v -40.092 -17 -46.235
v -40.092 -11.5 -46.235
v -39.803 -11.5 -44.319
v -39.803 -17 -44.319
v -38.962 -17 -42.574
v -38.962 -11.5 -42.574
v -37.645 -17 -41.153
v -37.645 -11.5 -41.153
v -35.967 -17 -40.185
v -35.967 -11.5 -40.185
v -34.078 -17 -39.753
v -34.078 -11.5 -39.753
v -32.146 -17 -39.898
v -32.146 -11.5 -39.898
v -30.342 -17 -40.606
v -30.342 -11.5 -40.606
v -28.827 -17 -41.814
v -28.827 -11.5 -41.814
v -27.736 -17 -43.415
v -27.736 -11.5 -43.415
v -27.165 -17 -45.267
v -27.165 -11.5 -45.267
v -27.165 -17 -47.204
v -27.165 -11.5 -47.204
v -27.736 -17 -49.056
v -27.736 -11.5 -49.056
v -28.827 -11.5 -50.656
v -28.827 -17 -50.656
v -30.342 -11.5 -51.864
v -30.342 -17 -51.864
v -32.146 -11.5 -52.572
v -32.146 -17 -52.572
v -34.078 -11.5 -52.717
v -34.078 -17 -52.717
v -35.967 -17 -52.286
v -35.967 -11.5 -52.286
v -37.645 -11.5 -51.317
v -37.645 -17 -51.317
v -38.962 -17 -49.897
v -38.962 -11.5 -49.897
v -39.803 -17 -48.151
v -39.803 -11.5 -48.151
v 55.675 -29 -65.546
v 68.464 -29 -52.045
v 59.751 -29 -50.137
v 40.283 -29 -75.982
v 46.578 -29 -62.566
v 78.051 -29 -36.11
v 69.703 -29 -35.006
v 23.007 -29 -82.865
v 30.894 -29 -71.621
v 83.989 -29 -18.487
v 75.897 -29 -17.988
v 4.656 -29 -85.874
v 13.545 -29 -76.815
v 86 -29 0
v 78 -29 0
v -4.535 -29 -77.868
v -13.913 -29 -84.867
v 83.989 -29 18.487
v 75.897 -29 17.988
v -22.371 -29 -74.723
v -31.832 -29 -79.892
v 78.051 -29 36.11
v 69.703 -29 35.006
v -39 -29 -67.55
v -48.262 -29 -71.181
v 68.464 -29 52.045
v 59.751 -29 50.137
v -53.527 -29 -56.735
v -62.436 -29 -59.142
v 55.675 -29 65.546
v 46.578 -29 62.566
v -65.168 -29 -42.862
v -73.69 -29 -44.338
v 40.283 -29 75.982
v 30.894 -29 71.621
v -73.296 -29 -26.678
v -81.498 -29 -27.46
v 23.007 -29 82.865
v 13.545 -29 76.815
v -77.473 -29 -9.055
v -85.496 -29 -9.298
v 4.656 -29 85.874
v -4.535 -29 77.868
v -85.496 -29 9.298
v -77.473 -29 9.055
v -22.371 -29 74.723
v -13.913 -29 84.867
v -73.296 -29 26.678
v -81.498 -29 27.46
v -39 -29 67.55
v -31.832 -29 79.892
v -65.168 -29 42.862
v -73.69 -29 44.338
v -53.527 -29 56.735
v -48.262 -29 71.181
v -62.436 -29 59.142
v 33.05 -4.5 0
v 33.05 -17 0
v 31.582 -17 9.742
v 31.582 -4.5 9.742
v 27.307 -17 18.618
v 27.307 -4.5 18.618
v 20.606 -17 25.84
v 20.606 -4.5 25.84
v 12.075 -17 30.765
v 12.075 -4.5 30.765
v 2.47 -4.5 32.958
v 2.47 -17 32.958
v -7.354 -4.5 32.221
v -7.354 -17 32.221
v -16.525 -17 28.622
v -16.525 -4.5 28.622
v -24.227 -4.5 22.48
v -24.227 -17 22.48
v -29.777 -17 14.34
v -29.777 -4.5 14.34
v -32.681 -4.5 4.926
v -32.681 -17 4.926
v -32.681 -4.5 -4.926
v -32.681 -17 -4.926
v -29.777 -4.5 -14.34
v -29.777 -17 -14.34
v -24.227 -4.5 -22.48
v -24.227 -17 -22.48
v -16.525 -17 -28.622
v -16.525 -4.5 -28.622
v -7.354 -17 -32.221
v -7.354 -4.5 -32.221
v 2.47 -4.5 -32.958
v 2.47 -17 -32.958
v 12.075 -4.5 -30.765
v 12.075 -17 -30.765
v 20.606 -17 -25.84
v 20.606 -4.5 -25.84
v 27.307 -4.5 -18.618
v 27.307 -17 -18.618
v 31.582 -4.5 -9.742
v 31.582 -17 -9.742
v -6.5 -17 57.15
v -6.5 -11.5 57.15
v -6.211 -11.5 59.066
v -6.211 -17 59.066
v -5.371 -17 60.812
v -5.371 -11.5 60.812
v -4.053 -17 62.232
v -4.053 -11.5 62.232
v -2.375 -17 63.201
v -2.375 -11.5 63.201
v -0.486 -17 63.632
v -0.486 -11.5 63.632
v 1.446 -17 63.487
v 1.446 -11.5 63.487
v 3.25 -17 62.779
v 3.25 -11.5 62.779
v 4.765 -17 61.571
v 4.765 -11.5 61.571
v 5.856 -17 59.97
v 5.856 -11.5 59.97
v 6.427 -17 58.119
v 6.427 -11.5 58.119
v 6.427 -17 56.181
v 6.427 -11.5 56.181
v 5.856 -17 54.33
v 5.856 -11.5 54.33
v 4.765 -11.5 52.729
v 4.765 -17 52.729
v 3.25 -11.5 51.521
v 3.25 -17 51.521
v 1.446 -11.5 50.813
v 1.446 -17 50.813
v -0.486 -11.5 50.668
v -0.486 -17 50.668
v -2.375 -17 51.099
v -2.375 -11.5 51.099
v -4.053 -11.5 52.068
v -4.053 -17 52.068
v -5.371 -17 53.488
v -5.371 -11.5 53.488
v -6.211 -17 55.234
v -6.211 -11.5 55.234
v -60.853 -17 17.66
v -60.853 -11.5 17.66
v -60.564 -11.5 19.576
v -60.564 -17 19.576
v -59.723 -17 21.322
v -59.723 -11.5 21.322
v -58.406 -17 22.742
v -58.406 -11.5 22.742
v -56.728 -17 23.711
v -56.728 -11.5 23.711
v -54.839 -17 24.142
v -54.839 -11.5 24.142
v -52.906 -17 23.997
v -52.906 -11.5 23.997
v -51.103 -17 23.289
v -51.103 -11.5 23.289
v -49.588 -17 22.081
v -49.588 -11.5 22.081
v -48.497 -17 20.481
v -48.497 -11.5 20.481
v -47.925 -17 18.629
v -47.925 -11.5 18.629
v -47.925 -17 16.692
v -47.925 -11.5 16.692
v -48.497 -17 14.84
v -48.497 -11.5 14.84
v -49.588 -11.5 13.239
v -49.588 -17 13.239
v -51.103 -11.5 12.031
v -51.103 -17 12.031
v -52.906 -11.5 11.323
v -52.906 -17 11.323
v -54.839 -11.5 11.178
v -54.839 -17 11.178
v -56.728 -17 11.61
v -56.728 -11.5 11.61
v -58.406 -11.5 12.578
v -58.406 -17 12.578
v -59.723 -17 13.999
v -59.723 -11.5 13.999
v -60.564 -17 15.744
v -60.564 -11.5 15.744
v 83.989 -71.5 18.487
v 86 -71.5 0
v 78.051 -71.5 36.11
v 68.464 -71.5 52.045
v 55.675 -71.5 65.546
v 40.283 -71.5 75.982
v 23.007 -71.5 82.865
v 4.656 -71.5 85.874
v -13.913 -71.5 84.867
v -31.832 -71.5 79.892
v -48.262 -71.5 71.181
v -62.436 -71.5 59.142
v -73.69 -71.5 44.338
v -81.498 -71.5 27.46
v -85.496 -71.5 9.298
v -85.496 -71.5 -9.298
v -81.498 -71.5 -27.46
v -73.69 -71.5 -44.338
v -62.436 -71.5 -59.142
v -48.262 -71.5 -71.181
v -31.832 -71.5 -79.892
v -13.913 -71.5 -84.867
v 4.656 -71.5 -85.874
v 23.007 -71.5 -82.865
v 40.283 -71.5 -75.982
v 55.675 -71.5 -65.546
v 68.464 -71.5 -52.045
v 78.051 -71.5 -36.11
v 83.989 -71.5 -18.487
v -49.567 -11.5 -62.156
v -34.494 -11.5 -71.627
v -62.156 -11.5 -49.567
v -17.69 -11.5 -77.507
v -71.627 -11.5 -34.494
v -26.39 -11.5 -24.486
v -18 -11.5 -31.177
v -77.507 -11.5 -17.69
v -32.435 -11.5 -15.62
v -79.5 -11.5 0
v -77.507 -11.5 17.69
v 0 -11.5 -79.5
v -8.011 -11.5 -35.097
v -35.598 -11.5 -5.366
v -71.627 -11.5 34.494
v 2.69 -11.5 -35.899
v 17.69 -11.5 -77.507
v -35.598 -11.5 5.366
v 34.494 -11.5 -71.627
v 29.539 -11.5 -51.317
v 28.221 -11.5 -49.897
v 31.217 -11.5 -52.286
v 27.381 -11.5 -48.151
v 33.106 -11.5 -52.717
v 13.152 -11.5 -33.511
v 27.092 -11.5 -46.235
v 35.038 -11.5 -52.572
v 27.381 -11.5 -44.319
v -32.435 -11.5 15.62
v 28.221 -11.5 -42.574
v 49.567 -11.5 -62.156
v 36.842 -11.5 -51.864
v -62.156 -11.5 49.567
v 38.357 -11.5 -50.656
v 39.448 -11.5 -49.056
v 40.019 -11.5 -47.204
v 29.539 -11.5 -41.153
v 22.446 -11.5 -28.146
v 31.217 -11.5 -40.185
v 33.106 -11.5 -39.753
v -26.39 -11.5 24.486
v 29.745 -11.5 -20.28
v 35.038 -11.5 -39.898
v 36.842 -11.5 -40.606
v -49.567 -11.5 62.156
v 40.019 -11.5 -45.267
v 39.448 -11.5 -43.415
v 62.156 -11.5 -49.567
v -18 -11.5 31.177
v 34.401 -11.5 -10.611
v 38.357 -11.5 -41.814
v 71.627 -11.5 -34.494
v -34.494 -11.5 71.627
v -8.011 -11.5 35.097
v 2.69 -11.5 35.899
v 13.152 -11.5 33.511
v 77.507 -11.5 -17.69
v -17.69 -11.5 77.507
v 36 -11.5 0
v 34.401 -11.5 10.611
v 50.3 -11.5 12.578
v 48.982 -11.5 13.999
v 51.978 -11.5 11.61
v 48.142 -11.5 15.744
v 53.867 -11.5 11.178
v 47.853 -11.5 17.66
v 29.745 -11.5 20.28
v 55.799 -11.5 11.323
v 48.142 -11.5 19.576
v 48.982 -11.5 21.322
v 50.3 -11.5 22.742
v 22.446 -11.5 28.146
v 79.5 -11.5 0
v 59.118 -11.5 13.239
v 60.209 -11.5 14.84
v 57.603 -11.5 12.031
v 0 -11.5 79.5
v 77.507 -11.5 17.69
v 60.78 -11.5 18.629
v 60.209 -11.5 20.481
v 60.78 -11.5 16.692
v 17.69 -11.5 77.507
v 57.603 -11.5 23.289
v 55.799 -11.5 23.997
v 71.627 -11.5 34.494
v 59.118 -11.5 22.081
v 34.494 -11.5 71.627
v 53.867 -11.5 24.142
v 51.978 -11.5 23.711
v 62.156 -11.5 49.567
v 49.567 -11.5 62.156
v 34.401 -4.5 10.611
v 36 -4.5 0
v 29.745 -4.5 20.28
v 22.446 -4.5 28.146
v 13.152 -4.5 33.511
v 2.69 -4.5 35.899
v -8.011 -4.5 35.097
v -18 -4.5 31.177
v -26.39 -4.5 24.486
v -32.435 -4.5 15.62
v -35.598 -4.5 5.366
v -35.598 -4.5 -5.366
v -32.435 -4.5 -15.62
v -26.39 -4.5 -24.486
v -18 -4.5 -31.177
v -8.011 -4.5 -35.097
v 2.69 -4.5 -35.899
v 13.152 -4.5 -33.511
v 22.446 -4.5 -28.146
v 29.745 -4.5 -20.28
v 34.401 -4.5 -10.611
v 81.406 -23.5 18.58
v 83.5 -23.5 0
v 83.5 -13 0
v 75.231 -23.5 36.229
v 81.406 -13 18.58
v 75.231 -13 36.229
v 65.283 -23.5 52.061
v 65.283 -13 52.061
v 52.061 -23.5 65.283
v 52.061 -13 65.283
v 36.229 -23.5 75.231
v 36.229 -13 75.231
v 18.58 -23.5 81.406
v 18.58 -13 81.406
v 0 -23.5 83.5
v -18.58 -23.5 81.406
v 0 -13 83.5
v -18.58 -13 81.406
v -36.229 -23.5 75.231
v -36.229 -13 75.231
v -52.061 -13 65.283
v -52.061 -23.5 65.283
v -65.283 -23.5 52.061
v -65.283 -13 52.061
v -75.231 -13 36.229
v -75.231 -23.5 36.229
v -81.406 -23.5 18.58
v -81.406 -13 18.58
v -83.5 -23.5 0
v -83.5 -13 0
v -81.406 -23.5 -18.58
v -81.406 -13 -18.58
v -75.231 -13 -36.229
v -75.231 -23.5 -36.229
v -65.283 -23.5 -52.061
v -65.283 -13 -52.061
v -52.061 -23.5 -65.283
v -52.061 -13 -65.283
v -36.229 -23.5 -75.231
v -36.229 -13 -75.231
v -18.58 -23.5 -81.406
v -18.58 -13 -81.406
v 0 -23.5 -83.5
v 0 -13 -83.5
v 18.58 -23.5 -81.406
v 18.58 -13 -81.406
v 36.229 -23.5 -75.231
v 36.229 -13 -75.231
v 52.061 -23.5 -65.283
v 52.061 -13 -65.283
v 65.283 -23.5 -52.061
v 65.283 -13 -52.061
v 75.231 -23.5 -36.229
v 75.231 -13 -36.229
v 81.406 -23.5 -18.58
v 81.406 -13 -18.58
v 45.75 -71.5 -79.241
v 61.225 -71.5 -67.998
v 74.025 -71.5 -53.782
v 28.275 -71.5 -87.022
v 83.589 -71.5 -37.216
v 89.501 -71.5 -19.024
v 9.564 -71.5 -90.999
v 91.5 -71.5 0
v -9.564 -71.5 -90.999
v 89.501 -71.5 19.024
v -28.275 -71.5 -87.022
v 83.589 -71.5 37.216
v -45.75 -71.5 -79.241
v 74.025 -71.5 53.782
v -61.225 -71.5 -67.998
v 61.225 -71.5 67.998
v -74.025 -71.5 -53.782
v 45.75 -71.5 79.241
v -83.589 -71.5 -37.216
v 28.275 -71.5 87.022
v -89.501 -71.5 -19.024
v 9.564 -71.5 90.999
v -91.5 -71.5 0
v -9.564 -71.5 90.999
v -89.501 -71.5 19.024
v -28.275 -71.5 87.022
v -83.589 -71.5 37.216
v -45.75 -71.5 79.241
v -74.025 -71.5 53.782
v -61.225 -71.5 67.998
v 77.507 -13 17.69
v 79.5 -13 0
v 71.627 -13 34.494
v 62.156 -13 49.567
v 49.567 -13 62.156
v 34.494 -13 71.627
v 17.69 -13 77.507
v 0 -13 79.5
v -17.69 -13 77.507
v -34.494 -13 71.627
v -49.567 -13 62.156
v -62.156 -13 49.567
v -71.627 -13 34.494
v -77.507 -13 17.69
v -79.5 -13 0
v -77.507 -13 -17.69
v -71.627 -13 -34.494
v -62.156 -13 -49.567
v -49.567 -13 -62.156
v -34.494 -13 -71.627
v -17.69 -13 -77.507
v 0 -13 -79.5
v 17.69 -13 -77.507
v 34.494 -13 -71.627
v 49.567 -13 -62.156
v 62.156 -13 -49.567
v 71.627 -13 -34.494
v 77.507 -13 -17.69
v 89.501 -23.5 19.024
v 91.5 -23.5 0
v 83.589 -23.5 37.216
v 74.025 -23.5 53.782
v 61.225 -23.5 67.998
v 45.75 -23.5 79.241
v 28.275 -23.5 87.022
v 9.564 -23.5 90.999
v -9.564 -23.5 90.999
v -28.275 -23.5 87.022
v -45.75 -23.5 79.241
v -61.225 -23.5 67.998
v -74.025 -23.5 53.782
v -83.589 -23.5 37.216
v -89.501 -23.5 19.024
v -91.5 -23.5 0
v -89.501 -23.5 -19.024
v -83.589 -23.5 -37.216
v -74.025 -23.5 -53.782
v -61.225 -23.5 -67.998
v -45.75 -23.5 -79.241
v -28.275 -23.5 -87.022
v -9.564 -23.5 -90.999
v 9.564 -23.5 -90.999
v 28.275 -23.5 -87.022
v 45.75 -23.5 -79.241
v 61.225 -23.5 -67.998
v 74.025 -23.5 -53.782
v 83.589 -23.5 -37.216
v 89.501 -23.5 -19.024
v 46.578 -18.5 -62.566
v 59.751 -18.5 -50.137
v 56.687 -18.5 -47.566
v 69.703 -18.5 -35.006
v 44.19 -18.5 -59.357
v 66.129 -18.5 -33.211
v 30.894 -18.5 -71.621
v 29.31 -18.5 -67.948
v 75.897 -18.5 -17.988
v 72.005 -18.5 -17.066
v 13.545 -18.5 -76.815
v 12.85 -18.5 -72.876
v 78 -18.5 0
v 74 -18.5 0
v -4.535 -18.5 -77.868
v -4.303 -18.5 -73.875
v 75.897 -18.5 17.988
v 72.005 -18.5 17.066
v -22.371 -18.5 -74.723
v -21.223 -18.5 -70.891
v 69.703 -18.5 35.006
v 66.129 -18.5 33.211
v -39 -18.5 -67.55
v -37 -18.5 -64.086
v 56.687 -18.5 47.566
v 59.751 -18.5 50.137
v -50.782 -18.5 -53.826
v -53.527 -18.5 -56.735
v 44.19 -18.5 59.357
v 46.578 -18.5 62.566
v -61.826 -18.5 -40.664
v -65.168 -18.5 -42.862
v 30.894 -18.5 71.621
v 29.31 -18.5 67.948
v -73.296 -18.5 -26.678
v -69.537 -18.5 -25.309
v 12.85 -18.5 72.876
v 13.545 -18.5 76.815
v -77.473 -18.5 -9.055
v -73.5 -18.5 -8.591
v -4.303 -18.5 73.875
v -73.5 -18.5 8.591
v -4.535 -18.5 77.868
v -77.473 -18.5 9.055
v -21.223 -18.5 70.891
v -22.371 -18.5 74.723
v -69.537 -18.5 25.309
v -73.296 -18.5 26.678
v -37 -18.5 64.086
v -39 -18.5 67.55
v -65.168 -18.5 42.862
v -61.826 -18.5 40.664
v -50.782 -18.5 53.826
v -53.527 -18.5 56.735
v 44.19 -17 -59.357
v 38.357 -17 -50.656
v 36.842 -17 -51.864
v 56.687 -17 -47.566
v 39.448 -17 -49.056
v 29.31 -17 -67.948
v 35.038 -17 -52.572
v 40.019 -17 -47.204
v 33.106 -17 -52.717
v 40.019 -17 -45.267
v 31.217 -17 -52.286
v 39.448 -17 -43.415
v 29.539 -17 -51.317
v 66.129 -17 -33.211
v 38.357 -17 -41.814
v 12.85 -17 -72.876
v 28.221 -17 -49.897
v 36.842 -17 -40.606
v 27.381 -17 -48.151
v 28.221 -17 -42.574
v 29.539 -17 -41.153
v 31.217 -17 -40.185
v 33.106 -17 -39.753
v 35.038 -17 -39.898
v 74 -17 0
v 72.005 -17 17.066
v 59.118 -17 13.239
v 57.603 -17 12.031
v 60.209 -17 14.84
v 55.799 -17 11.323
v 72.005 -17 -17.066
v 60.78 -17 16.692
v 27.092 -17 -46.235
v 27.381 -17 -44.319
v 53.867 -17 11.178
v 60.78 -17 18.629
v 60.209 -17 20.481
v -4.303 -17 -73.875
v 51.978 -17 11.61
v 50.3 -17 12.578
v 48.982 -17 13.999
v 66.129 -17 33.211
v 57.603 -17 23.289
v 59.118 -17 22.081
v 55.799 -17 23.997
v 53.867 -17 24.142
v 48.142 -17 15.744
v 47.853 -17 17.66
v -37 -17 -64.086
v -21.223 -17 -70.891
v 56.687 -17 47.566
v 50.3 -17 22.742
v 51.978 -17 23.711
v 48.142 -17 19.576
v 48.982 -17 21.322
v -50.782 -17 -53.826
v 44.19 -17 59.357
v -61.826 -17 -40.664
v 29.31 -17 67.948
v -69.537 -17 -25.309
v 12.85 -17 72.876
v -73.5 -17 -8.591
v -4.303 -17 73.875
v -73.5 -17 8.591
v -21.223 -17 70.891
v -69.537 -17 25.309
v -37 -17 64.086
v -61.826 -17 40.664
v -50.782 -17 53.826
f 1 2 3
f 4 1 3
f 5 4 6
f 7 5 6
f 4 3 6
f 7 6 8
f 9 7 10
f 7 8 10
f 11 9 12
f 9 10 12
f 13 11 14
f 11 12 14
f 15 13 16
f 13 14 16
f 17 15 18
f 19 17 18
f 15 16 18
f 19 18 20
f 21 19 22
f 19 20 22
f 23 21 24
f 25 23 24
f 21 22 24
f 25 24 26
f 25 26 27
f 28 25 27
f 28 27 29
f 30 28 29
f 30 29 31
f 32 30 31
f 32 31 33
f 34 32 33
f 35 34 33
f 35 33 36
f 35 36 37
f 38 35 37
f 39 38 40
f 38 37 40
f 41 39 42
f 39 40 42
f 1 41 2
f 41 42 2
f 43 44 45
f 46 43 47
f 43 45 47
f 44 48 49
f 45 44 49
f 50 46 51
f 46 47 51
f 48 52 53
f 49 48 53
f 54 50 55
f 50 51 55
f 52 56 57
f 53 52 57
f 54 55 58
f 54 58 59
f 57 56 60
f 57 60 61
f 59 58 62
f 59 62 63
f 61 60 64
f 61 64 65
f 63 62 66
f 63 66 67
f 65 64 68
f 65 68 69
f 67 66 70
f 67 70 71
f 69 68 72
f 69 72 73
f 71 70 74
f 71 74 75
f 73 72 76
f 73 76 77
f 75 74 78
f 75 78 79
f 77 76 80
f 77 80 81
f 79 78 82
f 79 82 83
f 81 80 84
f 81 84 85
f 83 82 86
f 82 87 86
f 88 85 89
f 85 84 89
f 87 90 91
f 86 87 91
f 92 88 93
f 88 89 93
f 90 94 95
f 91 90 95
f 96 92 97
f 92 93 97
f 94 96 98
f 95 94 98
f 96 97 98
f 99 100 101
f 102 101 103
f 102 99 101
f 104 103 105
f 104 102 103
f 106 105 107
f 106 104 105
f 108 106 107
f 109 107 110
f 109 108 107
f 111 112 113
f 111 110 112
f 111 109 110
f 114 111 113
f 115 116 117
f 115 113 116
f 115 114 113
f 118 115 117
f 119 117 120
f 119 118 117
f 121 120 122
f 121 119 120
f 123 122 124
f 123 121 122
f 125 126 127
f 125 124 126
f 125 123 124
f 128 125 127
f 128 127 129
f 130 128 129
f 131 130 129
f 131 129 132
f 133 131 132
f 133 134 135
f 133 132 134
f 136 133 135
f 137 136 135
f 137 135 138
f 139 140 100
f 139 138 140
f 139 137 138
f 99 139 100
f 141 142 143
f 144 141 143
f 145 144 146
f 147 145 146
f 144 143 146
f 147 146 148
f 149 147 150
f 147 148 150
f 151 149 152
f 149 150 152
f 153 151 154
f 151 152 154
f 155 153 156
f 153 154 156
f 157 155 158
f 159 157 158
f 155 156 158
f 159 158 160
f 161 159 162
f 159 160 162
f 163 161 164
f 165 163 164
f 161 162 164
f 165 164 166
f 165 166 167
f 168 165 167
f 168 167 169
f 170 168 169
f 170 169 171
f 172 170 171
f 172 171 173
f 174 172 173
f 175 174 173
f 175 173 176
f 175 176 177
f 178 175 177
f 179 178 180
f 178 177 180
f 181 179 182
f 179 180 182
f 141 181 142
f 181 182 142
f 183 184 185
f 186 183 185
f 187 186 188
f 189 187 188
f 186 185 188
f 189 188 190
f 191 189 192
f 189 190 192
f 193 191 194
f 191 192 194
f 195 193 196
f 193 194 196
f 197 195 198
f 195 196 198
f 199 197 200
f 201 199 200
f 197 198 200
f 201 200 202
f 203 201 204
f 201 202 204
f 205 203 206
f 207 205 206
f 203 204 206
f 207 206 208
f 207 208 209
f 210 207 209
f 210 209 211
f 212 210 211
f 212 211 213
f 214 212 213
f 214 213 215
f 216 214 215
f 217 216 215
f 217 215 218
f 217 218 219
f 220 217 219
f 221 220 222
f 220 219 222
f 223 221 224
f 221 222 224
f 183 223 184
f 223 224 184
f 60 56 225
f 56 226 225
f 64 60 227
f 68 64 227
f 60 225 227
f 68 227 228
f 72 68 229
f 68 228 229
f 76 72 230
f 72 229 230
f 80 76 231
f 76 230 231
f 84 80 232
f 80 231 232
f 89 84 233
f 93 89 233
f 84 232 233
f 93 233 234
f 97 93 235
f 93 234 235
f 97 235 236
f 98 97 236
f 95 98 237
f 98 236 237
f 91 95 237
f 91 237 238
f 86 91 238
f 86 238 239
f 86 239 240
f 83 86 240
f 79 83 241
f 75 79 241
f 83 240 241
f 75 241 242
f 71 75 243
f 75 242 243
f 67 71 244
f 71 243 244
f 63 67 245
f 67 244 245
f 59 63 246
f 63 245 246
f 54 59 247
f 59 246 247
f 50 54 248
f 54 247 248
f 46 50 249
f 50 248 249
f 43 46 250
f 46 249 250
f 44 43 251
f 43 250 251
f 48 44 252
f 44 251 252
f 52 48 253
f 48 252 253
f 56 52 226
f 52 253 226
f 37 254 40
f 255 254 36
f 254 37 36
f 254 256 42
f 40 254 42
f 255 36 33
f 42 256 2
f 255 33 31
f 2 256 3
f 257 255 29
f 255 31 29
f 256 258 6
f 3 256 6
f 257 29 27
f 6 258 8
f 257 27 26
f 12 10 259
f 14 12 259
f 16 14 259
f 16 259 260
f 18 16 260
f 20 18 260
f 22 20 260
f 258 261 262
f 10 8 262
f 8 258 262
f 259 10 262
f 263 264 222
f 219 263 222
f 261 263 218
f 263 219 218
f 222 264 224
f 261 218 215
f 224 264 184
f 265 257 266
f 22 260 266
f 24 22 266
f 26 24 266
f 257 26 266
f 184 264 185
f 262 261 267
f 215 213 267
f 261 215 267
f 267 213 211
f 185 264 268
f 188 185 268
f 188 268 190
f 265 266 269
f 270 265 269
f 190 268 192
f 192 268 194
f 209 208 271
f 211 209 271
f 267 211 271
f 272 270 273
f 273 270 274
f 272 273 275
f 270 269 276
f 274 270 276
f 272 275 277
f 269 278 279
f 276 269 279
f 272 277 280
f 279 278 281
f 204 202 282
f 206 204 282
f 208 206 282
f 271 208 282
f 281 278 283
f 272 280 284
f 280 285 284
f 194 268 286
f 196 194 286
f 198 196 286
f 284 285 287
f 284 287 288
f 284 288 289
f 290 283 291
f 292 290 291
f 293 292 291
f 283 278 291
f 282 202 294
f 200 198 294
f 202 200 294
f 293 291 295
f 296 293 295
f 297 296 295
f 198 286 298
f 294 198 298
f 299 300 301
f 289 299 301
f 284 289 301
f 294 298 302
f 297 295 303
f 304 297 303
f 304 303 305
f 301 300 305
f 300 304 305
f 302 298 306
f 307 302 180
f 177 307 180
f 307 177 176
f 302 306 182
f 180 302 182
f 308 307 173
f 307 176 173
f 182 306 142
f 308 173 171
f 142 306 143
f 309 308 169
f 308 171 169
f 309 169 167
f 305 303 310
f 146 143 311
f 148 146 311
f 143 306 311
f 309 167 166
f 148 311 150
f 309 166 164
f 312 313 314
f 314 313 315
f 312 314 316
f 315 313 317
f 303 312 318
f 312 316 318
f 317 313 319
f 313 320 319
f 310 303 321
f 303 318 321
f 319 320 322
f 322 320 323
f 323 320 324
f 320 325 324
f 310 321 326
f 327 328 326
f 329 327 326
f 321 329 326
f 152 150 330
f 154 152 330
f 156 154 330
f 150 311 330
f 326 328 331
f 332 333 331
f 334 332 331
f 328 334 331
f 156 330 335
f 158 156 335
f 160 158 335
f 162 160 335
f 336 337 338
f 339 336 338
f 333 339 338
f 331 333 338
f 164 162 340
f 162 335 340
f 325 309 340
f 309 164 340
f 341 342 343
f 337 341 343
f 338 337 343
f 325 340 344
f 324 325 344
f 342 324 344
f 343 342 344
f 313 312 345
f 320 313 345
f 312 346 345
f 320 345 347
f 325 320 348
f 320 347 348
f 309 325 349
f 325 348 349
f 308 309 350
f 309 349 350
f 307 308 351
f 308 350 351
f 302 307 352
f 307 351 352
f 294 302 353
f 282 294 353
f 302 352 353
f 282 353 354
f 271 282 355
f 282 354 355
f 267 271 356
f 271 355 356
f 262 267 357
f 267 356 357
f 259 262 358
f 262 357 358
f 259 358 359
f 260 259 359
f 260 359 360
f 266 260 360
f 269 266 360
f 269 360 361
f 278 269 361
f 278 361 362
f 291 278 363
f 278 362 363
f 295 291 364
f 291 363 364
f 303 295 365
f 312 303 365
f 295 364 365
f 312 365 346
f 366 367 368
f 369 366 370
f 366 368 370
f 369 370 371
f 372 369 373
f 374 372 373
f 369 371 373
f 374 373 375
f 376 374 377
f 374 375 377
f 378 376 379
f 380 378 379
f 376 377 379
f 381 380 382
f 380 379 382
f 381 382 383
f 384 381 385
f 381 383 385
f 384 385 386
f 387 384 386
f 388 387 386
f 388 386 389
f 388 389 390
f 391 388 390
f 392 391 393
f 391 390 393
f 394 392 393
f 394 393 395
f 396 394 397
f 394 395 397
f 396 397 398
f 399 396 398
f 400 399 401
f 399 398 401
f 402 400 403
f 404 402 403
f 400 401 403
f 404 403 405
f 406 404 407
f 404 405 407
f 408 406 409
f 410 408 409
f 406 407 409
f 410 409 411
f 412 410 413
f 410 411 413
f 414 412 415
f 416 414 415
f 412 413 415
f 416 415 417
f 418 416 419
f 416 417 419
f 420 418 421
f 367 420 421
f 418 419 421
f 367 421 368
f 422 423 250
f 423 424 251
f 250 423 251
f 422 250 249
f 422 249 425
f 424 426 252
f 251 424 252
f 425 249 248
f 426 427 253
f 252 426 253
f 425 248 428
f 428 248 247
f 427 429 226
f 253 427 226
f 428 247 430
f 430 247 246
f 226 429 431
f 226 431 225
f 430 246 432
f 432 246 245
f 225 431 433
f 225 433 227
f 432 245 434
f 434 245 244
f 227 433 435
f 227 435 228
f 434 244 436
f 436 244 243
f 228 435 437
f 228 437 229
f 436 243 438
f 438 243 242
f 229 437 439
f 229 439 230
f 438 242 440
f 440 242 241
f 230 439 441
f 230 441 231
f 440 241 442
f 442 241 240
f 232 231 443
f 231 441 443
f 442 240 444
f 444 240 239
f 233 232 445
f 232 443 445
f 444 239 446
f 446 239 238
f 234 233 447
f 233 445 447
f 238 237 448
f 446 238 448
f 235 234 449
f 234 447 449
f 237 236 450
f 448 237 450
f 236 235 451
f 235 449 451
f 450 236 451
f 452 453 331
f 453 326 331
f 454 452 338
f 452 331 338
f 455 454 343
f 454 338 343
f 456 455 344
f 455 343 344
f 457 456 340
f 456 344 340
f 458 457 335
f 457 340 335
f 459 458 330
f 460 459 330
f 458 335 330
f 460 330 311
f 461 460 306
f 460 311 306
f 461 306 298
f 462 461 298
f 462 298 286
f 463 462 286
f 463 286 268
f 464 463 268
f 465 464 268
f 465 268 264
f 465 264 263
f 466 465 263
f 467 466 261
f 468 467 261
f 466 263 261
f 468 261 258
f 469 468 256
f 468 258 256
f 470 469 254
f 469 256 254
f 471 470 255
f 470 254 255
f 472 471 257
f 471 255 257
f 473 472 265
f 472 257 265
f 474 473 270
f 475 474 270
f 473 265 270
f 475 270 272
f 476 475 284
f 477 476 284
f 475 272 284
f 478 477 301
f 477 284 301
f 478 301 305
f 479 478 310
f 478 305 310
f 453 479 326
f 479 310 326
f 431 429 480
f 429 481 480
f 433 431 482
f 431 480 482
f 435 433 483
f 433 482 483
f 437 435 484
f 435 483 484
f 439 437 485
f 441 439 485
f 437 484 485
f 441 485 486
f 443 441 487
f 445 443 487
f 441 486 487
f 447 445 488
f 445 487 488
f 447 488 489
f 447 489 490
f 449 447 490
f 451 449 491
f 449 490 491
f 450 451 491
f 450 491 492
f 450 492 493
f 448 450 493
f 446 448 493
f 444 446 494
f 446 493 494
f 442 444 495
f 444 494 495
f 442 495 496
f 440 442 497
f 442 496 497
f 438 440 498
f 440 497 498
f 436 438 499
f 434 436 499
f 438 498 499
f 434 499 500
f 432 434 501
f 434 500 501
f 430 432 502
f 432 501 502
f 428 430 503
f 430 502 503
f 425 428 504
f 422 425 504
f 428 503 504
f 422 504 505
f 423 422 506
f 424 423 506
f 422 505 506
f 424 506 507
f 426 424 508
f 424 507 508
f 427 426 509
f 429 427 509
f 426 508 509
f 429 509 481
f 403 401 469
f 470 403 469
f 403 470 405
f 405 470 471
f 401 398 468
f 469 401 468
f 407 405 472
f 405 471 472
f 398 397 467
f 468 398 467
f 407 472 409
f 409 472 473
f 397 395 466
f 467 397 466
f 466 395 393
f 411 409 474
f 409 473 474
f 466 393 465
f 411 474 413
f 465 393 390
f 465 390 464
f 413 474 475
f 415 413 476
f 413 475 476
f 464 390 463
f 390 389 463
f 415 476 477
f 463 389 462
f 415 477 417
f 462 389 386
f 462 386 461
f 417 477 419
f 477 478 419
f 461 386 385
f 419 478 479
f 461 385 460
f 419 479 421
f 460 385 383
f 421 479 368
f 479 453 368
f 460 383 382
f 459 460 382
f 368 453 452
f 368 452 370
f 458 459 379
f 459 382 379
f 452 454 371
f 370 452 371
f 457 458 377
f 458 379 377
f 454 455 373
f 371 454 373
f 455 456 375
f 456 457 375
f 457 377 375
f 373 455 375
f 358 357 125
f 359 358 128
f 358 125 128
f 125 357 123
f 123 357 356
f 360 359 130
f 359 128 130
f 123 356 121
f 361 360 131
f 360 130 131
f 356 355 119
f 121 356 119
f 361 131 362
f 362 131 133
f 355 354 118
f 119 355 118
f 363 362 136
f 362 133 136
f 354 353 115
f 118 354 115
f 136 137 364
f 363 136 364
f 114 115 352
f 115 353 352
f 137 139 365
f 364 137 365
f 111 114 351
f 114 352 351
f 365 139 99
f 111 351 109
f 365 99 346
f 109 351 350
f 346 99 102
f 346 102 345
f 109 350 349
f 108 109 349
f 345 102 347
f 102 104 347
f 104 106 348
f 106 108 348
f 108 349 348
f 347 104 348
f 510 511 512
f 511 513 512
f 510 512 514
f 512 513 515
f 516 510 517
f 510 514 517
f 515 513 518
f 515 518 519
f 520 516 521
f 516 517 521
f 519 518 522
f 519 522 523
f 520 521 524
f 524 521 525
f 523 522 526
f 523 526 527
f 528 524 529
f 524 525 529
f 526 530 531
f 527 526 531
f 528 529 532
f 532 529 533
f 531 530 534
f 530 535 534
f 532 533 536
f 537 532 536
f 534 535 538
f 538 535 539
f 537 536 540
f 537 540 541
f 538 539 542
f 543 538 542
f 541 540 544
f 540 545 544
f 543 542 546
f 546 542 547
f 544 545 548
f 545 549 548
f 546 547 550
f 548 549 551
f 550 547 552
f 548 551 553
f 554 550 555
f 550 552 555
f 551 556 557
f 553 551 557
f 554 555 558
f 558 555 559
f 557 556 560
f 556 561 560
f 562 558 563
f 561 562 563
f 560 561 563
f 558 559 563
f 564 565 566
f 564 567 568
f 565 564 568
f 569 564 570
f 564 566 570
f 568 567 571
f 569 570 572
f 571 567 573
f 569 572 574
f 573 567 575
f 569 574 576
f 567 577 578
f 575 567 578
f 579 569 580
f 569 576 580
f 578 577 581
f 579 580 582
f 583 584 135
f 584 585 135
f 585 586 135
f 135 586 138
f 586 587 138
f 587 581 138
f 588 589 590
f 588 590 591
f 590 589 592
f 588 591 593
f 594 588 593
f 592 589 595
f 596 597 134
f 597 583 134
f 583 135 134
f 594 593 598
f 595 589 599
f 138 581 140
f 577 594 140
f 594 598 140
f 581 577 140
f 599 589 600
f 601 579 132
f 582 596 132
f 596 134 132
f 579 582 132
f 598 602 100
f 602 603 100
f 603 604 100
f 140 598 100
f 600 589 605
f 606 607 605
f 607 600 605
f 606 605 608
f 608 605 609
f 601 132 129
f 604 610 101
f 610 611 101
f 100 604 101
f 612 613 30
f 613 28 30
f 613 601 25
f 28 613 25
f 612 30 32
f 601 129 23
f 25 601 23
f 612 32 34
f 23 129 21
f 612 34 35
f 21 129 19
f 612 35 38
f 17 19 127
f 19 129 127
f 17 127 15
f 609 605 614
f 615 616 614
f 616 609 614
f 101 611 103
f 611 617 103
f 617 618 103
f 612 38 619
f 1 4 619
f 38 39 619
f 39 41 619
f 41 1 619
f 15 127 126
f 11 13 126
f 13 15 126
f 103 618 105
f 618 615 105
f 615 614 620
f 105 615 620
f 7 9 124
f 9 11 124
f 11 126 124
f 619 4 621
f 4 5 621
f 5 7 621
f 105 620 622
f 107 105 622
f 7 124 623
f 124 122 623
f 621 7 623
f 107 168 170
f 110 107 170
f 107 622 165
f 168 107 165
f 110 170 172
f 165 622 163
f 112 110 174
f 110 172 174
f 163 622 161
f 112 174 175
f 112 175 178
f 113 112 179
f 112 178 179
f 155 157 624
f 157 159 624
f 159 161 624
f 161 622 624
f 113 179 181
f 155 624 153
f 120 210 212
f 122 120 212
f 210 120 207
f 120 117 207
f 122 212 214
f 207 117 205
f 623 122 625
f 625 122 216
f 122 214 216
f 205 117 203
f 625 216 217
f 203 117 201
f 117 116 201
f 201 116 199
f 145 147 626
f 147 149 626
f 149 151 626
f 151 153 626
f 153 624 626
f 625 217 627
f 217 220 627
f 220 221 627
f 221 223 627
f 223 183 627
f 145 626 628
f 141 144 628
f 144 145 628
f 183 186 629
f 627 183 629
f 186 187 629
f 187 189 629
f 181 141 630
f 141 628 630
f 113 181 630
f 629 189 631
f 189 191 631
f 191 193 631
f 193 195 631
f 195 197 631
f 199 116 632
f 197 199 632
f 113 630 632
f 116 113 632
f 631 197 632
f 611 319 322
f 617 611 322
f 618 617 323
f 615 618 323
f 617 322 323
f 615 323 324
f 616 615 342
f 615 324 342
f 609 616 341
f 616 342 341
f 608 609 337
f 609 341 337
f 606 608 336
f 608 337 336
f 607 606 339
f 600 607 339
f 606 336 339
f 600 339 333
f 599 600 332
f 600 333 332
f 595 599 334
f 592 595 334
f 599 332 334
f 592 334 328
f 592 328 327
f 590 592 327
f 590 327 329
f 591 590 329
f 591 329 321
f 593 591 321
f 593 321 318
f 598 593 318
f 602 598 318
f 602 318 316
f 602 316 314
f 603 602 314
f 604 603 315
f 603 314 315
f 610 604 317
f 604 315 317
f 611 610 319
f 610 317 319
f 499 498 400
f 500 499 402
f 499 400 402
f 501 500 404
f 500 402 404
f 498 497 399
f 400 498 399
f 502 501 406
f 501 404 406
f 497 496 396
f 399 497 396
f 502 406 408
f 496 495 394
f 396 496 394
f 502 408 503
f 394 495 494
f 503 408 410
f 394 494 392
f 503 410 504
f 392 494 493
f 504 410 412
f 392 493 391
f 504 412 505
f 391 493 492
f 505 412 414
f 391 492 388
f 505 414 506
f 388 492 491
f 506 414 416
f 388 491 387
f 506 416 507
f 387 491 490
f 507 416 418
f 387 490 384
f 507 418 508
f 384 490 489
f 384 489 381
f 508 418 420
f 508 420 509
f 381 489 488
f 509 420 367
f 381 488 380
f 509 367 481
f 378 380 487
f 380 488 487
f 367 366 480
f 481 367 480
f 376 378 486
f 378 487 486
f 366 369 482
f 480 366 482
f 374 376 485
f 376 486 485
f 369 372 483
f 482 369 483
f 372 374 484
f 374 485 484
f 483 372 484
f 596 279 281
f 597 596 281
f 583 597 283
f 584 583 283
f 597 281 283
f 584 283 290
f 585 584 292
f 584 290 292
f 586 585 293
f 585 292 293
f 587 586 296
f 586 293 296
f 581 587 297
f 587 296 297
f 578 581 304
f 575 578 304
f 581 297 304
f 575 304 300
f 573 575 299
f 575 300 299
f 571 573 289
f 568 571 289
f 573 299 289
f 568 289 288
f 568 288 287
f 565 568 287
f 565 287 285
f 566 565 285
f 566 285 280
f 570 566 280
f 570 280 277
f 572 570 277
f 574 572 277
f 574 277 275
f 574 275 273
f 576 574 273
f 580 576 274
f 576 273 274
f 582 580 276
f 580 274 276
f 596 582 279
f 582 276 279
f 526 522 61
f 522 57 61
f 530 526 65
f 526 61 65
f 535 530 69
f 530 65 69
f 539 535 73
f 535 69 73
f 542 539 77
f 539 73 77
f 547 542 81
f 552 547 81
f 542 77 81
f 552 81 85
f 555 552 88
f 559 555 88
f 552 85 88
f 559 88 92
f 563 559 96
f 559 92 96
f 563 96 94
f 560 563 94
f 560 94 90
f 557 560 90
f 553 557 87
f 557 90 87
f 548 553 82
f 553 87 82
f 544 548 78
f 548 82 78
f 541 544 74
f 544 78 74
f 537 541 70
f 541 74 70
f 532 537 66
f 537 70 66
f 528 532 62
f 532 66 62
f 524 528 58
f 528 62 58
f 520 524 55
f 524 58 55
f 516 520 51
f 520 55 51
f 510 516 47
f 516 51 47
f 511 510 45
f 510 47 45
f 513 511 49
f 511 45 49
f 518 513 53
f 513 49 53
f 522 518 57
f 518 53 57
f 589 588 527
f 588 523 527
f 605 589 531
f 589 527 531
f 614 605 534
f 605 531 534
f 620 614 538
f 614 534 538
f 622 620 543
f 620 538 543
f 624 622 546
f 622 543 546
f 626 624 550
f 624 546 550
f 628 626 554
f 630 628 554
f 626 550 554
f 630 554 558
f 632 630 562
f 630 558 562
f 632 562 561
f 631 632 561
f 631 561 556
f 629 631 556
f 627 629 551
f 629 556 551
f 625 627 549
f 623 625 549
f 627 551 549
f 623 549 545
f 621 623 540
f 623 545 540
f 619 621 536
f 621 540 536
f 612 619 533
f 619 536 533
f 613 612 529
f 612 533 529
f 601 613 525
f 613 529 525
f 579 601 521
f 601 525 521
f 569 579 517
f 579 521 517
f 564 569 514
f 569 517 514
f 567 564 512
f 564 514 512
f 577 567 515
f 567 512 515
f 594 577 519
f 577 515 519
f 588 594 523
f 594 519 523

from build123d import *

# Parameters (mm, degrees)
F2_R     = 6.5
F3_DEPTH = 5.5
F4_DEPTH = 77.001


with BuildPart() as f1:
    # F0 (on Top) → F1 (revolve)
    with BuildSketch(Plane.XY):
        Polygon((86, -29), (86, -71.5), (91.5, -71.5), (91.5, -23.5), (83.5, -23.5), (83.5, -13), (79.5, -13), (79.5, -11.5), (36, -11.5), (36, -4.5), (33.05, -4.5), (33.05, 5.5), (0, 5.5), (0, 0), (27.55, 0), (27.55, -10), (30.5, -10), (30.5, -17), (74, -17), (74, -18.5), (78, -18.5), (78, -29), align=None)
    revolve(axis=Axis((0, 2.75, 0), (0, -1, 0)))

    # F2 (on face) → F3 (cut, through all)
    with BuildSketch(Plane(origin=(0, -11.5, 0), x_dir=(-1, 0, 0), z_dir=(0, 1, 0))):
        with Locations((0, 57.15)):
            Circle(F2_R)
        with Locations((-54.3528799063, 17.6603212285)):
            Circle(F2_R)
        with Locations((-33.5919271685, -46.2353212285)):
            Circle(F2_R)
        with Locations((33.5919271685, -46.2353212285)):
            Circle(F2_R)
        with Locations((54.3528799063, 17.6603212285)):
            Circle(F2_R)
    extrude(amount=-F3_DEPTH, mode=Mode.SUBTRACT)

    # F4 (cut, through all): a face of the model
    f4_faces = [f1.faces().sort_by_distance(p)[0] for p in [
        (0, 5.5, 0),
    ]]
    extrude(f4_faces, amount=-F4_DEPTH, mode=Mode.SUBTRACT)


solid = f1.part
